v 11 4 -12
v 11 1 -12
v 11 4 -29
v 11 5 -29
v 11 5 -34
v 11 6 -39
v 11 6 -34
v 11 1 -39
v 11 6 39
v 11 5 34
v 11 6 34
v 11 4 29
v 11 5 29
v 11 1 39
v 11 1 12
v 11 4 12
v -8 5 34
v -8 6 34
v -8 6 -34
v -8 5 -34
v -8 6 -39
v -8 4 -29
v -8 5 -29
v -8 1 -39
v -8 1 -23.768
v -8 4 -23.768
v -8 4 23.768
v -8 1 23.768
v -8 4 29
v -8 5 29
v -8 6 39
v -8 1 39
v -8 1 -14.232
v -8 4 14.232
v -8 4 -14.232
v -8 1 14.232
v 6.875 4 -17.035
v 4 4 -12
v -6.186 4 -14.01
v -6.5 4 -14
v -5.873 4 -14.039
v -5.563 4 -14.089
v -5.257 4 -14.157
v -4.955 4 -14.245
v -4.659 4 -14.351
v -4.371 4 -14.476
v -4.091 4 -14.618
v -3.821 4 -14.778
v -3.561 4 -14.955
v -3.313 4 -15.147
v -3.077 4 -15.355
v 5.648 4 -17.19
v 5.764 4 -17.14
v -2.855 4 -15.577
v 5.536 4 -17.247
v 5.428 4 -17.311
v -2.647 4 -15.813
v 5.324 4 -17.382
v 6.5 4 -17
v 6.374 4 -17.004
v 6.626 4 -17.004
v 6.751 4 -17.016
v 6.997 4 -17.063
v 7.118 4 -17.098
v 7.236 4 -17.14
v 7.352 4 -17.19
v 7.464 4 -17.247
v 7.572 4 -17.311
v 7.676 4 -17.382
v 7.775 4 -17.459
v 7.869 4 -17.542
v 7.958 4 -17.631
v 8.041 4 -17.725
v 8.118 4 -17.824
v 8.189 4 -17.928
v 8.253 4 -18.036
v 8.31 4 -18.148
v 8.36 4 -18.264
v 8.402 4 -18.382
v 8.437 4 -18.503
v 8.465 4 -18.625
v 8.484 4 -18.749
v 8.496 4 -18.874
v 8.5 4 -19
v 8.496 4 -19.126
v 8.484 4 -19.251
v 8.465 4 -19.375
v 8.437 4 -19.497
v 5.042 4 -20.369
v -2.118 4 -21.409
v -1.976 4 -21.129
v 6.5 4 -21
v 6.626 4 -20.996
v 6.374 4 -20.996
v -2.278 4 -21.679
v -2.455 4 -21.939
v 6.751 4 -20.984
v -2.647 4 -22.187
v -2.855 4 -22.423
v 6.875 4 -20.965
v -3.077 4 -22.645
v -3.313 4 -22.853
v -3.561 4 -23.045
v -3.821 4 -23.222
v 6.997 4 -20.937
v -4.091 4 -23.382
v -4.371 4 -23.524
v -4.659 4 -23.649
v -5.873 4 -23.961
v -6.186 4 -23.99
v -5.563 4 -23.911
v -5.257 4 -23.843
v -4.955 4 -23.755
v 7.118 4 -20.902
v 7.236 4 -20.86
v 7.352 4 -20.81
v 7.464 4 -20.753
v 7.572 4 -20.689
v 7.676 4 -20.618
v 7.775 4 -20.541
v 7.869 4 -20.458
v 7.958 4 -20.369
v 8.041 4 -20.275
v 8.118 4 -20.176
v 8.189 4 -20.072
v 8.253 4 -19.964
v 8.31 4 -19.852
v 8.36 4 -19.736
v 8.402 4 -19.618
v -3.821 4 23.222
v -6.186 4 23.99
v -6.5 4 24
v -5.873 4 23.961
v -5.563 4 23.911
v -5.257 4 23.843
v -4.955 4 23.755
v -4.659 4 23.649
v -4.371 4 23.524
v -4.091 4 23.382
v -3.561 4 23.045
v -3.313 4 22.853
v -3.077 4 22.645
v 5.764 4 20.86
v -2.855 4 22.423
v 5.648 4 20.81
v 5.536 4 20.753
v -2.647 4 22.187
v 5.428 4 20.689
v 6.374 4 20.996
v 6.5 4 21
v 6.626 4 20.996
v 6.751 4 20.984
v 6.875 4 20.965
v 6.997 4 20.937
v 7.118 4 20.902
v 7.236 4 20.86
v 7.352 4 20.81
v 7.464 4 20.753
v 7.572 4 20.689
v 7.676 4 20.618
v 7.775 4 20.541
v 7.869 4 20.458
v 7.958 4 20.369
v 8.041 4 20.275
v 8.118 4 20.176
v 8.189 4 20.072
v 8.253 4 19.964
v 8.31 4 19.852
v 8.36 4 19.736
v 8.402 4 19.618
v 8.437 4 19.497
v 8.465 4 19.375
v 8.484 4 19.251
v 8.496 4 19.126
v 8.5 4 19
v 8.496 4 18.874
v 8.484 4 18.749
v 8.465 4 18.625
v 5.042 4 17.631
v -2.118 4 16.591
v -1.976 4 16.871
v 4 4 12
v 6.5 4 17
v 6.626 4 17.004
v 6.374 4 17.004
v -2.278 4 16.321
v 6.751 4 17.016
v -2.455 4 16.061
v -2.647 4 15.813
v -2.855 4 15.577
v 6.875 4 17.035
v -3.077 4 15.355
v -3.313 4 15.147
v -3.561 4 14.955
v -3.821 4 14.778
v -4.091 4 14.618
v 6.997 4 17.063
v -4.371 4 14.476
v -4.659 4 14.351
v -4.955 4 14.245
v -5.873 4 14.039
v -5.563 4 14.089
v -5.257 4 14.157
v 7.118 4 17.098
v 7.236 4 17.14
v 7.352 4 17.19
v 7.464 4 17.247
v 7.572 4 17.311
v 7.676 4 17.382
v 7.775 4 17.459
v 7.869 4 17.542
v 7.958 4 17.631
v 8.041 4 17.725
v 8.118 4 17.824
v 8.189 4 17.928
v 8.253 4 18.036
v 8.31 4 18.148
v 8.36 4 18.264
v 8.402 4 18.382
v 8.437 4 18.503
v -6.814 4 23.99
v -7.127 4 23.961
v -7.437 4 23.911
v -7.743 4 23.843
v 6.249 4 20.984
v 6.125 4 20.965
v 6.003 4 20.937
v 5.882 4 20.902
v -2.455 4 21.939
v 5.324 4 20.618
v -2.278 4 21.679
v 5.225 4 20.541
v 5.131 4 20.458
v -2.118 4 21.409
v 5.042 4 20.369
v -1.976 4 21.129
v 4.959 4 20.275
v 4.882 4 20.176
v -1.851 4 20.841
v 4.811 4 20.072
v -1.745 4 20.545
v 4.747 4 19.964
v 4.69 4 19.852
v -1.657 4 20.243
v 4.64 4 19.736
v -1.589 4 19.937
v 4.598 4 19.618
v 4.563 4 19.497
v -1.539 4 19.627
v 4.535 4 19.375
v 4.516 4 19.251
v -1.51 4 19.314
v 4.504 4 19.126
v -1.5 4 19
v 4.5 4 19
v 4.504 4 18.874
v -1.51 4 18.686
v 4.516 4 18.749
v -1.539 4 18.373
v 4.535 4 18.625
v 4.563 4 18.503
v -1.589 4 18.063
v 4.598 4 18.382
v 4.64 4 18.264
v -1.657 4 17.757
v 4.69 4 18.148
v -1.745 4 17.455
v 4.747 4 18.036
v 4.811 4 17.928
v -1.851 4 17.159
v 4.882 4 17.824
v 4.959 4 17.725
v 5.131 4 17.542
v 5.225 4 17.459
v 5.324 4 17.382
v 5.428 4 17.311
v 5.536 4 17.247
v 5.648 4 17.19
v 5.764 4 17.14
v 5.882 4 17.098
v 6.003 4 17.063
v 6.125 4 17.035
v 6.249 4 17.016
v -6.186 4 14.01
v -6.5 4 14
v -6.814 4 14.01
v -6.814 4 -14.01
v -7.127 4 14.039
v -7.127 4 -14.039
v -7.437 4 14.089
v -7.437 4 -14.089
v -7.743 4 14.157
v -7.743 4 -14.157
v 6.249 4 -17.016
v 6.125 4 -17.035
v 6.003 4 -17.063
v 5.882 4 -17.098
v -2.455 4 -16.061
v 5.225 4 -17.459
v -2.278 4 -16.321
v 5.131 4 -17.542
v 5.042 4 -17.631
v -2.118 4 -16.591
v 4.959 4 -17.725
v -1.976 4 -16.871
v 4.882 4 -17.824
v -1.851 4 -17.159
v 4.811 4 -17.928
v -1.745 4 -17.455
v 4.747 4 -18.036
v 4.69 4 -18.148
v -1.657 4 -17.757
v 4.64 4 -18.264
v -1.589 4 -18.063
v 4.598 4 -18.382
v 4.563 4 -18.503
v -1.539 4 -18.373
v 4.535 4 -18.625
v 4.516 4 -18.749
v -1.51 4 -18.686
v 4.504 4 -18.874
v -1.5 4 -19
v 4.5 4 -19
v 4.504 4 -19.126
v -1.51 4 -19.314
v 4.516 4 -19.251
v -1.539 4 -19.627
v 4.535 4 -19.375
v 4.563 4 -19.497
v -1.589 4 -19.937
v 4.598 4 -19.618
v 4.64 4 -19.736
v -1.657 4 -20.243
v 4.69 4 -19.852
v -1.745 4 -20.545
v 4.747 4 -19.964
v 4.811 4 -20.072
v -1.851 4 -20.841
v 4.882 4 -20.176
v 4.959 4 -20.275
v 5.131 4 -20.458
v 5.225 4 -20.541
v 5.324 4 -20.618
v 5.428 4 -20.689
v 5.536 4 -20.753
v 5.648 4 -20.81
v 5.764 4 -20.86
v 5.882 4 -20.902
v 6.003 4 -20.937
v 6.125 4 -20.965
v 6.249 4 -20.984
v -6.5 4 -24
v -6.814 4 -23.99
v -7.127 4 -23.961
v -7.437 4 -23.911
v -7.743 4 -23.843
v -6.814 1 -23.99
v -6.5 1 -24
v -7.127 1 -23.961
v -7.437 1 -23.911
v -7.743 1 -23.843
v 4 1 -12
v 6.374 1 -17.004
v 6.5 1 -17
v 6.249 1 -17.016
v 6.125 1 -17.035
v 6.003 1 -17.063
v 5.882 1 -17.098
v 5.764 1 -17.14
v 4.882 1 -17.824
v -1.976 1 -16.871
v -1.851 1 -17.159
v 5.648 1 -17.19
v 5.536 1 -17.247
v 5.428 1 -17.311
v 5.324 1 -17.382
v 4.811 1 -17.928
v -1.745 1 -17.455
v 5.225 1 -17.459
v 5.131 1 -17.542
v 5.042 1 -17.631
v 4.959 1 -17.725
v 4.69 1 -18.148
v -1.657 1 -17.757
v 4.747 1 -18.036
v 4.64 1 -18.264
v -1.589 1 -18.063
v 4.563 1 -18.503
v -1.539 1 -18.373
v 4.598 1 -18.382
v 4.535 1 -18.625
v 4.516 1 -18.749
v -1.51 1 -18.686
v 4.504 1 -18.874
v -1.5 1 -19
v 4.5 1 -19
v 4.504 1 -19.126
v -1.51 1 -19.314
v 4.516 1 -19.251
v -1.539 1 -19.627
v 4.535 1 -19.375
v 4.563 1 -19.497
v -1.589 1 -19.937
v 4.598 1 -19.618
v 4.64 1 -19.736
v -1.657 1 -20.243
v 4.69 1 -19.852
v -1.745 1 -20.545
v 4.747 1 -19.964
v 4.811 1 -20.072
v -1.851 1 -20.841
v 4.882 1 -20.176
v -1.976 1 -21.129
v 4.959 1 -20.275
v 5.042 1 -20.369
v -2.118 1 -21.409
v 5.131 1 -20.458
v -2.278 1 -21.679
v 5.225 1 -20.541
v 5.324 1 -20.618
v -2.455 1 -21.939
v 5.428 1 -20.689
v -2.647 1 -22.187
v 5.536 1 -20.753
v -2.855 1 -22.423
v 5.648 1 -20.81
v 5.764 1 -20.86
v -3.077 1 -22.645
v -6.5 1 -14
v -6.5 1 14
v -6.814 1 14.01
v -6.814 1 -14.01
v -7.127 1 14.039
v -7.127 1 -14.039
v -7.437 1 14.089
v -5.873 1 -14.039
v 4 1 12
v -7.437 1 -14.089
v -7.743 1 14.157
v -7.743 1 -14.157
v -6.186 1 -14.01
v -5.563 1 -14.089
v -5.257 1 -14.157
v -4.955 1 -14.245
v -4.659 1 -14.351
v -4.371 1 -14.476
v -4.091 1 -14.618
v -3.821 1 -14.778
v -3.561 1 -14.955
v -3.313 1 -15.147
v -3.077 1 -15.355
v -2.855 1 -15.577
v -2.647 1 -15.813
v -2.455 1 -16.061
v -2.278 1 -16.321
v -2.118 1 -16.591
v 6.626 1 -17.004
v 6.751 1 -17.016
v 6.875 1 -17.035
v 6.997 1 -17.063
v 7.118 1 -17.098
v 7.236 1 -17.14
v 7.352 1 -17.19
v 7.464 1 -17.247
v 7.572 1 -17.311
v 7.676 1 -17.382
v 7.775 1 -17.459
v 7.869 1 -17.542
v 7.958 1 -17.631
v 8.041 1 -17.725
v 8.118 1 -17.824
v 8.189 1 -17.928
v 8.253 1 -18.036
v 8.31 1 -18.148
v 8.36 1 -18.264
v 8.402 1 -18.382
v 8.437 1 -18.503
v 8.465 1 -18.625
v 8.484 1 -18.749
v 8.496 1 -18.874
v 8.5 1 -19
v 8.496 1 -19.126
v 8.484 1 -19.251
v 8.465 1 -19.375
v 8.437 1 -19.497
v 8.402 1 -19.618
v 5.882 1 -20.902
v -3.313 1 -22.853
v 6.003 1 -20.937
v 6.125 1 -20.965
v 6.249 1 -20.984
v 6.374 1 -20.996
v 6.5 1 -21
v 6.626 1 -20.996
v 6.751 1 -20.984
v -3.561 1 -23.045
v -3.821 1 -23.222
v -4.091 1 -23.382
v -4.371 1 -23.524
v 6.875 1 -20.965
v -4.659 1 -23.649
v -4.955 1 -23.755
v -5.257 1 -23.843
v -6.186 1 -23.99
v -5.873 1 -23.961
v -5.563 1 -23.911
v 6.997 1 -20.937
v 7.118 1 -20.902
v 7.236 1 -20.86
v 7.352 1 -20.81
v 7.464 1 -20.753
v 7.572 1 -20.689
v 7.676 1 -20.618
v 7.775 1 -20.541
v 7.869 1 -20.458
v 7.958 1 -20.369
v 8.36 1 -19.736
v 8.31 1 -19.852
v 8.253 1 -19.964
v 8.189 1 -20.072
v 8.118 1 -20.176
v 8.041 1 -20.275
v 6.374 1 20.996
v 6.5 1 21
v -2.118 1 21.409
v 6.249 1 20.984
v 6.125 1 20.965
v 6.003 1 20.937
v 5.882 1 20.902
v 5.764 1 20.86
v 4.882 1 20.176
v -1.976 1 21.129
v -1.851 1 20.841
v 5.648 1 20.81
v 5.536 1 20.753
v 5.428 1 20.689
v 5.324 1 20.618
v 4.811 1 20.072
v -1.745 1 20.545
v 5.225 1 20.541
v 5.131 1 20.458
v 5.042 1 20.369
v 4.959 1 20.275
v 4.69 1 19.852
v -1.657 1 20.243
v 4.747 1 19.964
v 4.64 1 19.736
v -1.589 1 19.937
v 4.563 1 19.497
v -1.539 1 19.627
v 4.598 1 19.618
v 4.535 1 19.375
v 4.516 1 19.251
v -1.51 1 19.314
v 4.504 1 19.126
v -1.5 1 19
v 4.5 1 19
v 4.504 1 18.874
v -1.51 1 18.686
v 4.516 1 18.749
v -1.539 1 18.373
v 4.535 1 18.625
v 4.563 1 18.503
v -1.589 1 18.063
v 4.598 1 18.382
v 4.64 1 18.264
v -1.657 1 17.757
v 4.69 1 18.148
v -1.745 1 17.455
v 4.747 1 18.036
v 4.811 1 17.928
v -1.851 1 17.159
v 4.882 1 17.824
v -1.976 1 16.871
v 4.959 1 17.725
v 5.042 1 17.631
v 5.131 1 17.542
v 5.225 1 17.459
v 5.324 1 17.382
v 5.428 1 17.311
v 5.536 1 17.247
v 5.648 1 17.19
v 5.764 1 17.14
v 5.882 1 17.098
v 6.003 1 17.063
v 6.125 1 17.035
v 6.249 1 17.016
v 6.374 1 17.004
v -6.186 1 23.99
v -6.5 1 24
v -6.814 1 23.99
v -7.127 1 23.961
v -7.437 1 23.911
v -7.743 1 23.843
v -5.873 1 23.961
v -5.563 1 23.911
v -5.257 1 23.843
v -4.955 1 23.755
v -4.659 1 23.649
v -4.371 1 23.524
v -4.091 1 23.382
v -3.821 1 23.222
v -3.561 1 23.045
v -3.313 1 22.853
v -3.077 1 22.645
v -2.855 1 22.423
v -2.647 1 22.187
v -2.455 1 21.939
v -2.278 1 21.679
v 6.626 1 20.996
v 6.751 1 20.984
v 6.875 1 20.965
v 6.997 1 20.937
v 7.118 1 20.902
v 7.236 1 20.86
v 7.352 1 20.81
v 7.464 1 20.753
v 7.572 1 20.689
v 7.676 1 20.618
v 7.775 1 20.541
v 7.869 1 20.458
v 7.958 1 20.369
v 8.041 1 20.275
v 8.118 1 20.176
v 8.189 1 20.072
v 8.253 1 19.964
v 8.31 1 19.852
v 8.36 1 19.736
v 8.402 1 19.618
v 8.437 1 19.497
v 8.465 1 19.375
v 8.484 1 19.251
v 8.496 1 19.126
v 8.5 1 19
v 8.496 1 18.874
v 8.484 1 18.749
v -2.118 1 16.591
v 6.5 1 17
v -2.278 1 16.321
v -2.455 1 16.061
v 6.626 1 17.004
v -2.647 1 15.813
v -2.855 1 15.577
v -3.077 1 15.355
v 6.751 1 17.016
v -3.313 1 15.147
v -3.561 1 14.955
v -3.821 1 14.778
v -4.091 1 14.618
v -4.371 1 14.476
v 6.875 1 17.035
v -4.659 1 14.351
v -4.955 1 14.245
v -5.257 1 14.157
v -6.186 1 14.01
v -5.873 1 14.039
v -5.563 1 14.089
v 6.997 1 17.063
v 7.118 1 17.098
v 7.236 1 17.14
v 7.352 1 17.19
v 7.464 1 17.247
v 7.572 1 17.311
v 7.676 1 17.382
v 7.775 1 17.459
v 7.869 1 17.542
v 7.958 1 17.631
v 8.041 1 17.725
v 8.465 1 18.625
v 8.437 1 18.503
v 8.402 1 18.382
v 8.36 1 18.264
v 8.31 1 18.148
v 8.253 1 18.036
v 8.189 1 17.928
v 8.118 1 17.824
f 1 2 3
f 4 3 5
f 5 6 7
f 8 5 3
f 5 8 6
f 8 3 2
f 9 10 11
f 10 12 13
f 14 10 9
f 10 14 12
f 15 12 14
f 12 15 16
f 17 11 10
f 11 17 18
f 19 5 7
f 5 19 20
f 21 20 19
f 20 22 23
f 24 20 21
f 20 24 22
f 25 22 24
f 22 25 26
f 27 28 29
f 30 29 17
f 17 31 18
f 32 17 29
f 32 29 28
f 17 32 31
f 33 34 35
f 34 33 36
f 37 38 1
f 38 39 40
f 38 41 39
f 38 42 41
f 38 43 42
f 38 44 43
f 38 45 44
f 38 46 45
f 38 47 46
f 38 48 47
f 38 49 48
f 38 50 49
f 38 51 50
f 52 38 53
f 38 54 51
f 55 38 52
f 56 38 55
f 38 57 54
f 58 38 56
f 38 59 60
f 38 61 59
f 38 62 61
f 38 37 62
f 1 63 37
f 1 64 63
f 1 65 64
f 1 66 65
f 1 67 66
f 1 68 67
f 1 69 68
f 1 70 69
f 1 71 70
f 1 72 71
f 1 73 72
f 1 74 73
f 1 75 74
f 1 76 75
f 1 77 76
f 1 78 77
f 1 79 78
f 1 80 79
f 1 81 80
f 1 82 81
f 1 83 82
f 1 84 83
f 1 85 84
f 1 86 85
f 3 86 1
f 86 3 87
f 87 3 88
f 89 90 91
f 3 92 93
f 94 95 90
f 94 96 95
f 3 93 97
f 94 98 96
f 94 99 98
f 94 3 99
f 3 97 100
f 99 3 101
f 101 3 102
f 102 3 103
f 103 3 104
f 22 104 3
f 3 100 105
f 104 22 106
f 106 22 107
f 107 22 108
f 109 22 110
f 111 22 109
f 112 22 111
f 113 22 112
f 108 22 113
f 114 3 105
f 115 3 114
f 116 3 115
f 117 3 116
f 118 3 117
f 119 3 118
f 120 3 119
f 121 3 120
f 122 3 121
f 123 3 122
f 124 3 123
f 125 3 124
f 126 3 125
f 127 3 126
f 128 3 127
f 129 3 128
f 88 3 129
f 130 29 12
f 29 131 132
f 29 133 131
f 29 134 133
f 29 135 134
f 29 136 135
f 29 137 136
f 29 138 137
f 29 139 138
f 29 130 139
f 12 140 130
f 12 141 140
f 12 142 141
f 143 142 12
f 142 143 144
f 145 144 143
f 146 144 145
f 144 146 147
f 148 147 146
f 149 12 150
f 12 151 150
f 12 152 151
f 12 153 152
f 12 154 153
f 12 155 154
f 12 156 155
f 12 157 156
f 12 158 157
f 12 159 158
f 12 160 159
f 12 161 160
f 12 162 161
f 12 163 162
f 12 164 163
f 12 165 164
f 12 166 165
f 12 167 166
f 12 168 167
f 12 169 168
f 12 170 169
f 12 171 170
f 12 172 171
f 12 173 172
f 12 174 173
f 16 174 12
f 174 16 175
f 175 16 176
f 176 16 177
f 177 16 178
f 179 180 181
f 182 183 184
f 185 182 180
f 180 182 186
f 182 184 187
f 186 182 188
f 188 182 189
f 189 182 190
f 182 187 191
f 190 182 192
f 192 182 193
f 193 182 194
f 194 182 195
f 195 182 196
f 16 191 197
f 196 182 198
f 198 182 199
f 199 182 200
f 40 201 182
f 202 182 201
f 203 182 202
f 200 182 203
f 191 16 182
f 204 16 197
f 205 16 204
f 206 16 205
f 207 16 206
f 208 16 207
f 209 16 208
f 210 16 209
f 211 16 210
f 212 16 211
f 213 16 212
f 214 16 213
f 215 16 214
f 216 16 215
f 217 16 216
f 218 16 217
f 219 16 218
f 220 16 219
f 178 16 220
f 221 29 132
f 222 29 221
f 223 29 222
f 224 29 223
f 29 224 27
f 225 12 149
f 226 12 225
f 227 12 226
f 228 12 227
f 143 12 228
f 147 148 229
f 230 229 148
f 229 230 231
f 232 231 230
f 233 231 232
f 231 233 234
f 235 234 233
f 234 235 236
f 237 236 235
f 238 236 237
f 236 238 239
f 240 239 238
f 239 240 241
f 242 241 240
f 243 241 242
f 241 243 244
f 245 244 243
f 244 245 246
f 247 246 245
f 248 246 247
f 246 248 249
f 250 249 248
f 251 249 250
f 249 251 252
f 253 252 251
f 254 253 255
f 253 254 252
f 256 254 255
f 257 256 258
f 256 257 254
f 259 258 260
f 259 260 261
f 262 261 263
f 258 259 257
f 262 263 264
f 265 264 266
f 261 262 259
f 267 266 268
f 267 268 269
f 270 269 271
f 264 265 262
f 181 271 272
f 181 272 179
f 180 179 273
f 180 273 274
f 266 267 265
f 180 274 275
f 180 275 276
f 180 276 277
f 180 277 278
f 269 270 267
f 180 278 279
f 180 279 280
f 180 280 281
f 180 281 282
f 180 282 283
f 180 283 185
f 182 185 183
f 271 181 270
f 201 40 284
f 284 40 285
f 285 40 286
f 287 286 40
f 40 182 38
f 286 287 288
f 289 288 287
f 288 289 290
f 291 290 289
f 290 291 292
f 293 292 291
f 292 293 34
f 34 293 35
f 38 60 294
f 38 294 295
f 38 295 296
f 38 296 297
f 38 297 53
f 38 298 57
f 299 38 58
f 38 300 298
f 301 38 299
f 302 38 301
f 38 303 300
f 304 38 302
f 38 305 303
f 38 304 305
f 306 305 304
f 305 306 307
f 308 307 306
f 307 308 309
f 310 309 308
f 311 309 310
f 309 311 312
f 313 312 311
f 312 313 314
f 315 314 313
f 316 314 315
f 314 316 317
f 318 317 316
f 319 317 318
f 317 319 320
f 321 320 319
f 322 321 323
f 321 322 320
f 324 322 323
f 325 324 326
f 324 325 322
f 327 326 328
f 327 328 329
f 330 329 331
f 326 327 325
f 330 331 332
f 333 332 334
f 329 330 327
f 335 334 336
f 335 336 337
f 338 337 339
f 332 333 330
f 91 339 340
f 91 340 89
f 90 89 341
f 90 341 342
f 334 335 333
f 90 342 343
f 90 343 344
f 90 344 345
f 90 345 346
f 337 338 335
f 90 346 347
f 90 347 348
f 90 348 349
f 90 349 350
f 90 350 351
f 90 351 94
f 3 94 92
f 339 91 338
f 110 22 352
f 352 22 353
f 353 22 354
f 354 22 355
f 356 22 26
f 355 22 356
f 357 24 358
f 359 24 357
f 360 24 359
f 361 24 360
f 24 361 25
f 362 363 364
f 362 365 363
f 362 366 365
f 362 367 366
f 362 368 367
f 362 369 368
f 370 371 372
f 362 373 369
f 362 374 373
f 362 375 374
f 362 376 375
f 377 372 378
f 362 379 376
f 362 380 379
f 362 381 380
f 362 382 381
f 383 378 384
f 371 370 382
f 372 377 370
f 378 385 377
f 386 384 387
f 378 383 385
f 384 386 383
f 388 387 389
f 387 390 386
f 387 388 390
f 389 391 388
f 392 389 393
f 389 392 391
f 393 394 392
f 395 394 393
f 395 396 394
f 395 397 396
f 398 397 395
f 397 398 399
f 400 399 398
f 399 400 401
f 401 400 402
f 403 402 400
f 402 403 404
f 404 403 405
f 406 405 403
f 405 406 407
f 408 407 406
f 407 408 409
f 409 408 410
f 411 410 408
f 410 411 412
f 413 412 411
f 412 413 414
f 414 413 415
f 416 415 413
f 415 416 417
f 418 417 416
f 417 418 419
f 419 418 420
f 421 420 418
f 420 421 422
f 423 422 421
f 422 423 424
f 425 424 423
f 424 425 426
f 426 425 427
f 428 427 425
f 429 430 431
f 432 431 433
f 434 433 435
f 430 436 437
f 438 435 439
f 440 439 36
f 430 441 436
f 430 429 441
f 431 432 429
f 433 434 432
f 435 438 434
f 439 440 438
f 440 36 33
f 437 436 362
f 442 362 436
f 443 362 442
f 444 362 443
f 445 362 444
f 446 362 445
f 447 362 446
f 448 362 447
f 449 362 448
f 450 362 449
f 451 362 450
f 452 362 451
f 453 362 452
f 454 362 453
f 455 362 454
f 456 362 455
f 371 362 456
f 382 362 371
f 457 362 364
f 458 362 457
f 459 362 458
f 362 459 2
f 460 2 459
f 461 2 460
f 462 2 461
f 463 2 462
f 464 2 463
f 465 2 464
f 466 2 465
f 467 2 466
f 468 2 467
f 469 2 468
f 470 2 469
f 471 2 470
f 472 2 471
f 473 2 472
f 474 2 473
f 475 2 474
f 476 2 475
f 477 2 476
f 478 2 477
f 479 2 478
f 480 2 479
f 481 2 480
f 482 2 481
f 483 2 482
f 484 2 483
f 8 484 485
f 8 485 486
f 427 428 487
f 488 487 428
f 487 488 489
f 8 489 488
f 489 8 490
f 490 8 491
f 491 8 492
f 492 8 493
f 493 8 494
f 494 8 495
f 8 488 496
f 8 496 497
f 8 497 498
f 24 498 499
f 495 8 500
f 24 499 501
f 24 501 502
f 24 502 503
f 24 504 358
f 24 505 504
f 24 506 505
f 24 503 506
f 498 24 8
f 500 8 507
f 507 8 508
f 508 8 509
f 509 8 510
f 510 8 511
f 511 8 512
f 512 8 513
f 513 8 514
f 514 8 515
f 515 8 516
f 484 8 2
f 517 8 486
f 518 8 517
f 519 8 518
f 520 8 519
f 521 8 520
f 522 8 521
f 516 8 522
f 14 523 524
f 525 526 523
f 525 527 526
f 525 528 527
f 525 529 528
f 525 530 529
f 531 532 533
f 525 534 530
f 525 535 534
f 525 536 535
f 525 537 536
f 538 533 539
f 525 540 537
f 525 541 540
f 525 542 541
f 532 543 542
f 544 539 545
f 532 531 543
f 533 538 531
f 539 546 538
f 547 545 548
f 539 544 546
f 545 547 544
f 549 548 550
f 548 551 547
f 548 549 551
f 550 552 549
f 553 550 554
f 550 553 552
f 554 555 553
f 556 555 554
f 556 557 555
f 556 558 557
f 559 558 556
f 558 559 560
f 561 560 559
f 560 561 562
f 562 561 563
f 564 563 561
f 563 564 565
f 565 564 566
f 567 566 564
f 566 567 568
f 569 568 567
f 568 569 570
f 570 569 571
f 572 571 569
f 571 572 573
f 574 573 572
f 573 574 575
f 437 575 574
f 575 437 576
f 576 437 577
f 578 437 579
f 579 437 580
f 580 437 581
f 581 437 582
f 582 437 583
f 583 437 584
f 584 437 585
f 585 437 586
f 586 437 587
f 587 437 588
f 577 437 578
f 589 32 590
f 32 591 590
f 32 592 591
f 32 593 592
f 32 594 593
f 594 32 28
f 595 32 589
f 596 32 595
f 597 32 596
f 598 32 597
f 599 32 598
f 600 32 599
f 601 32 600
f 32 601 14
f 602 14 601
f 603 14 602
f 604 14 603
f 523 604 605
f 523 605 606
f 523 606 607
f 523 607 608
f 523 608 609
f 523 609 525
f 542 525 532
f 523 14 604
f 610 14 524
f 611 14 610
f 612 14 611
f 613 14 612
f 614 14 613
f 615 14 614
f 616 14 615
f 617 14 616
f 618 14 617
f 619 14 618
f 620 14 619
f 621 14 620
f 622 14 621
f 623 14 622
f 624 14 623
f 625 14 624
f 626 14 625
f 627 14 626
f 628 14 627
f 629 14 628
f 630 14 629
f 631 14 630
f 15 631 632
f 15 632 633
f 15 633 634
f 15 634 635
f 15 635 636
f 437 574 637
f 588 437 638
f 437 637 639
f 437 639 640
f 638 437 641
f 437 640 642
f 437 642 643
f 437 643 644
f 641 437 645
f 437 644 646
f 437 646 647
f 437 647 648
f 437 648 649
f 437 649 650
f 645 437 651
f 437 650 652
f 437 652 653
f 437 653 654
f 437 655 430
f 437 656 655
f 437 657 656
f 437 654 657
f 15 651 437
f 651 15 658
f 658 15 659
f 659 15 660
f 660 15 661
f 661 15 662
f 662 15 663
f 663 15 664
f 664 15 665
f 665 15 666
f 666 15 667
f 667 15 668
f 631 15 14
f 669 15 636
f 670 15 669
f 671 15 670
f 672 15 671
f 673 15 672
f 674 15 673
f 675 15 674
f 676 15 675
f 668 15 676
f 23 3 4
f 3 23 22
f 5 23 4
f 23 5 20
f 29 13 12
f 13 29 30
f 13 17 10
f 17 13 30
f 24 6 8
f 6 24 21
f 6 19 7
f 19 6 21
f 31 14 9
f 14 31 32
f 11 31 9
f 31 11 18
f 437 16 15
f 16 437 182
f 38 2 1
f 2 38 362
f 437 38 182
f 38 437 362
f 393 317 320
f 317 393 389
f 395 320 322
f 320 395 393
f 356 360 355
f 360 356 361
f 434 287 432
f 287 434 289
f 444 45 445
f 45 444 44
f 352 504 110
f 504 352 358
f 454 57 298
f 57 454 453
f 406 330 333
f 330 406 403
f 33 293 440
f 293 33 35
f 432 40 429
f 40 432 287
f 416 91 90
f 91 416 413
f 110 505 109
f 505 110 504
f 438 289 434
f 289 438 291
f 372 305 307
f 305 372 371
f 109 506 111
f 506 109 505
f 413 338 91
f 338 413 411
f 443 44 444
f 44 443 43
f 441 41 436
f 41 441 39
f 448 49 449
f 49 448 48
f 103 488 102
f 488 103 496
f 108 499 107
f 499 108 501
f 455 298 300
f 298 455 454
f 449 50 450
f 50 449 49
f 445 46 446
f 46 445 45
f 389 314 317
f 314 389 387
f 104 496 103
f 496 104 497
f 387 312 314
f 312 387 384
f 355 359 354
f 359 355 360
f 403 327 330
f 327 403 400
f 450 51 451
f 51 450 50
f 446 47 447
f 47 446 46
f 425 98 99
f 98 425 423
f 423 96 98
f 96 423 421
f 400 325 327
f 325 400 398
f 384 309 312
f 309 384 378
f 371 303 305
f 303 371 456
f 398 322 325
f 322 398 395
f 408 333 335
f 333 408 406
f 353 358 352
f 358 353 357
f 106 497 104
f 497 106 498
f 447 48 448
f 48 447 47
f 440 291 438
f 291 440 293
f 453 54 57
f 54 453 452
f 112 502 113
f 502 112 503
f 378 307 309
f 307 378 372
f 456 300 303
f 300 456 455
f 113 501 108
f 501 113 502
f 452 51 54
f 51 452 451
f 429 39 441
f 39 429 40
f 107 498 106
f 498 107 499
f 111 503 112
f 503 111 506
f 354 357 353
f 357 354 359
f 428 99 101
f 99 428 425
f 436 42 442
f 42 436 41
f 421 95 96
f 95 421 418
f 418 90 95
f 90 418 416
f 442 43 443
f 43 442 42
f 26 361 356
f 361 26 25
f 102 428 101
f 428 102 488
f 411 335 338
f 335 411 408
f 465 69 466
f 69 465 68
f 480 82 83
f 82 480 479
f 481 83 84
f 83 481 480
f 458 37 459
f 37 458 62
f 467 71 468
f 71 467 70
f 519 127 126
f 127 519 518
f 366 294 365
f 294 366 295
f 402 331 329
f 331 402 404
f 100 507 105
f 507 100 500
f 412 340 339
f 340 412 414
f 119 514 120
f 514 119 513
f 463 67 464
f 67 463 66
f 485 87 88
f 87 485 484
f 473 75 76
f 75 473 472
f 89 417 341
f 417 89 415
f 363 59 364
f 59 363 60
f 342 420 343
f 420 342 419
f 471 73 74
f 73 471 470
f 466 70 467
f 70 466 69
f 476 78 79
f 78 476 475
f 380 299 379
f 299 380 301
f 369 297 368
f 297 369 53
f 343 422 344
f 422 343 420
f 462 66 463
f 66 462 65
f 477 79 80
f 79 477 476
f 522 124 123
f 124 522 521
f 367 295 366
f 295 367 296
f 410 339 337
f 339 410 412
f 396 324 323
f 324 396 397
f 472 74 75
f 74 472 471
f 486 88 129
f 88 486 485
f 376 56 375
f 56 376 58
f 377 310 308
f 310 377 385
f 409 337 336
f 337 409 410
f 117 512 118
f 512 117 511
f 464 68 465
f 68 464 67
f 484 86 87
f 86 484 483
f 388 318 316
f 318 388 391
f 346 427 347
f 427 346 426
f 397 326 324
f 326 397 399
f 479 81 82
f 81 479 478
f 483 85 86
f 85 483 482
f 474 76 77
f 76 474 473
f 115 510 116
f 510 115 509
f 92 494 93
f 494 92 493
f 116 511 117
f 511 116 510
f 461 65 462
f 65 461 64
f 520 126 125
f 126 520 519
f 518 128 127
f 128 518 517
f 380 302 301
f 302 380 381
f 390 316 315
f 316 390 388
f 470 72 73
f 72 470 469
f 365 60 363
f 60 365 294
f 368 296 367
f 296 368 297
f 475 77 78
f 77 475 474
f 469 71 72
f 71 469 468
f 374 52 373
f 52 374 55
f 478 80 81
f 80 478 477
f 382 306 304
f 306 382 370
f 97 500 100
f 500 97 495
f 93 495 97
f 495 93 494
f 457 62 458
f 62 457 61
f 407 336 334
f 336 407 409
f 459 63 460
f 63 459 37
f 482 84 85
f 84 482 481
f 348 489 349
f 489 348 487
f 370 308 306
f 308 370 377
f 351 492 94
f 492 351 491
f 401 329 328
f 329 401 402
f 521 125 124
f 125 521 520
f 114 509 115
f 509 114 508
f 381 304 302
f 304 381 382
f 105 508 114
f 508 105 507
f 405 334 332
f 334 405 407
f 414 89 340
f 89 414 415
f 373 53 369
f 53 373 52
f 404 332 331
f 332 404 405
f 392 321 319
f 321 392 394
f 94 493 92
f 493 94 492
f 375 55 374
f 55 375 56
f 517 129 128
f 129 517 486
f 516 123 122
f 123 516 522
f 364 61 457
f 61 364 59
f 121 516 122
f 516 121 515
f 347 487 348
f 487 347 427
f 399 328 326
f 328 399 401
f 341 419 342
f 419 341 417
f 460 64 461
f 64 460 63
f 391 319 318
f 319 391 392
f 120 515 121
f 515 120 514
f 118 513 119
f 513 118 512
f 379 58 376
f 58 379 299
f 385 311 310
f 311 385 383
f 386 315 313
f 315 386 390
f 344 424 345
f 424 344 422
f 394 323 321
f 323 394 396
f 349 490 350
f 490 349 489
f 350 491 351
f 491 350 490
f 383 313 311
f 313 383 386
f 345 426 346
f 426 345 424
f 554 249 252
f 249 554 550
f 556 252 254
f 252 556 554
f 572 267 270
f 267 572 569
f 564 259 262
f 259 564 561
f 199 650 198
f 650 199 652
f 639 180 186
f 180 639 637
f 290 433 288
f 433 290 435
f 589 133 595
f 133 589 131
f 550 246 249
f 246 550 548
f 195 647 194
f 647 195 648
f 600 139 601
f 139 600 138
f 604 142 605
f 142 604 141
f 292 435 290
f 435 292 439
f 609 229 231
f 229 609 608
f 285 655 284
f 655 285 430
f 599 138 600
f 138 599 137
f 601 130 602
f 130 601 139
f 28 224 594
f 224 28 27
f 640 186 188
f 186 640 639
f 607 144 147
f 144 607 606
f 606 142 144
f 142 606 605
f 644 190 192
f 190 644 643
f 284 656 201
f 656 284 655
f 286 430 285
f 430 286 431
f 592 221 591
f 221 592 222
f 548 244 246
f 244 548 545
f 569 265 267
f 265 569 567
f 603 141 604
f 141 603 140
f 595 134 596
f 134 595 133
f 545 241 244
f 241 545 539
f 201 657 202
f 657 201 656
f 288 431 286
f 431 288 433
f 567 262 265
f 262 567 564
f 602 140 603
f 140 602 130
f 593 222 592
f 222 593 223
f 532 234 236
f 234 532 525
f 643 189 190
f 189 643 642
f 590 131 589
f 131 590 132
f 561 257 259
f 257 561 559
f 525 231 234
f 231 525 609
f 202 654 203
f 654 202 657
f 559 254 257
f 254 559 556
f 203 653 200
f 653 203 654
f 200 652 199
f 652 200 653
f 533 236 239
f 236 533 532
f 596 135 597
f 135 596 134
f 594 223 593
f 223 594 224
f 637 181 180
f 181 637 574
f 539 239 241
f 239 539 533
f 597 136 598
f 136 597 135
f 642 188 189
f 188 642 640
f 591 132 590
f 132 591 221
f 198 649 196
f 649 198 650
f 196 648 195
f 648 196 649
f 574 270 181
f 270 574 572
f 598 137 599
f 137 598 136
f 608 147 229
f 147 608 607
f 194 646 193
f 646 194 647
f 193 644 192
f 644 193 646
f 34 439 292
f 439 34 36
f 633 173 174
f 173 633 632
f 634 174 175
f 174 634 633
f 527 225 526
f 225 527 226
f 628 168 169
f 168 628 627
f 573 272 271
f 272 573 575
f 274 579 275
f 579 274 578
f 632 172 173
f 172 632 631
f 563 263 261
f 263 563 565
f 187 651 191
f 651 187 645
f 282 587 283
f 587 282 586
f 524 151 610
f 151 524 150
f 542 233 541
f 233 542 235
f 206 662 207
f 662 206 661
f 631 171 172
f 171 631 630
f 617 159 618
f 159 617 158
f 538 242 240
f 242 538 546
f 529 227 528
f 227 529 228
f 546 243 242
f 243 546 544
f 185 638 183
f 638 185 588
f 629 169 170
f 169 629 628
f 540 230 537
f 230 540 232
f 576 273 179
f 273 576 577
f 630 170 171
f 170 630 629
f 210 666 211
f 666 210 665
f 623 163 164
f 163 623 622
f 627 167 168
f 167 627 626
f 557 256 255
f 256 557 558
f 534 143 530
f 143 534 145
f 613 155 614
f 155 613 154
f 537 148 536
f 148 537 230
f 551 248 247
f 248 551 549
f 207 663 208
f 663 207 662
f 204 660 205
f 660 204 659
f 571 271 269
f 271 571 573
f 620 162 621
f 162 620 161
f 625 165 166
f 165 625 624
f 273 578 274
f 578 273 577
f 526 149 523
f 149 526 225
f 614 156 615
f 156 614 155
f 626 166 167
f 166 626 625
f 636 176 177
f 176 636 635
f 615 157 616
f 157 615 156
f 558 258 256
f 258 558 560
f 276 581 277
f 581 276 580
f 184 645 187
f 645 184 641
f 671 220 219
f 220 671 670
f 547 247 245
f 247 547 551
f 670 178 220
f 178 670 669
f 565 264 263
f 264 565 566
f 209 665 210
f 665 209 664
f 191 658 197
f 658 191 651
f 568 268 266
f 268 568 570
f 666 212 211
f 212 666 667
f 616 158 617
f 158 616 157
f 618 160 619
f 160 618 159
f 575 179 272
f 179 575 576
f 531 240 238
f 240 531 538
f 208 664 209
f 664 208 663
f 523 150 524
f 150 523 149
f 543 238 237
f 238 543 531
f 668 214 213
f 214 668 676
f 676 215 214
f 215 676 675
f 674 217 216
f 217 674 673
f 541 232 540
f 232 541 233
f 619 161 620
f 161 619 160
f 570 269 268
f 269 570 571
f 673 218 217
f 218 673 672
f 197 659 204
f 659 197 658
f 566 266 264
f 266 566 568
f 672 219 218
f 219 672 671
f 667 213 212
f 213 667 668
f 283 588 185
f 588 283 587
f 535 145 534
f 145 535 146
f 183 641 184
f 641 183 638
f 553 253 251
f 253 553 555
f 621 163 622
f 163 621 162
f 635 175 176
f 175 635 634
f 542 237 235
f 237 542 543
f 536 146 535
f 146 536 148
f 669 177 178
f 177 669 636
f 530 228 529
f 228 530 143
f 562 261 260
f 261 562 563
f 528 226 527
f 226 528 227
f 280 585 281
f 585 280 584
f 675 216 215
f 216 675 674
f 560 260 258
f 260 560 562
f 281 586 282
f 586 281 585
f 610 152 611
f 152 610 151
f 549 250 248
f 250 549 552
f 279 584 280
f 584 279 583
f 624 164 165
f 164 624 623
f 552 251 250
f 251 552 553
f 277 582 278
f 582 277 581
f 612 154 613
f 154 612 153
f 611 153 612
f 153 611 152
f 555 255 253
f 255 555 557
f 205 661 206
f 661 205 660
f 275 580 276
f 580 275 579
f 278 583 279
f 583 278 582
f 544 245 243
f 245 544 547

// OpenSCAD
difference(){
	union(){
        translate([-8,1,-34]){
            cube([19,3,68], center=false);
        }           

        translate([-8,1,-34]){
            cube([19,4,5], center=false);
        }           
        translate([-8,1,-34+68-5]){
            cube([19,4,5], center=false);
        }           

        translate([-8,1,-34-5]){
            cube([19,5,5], center=false);
        }           
        translate([-8,1,-34+68]){
            cube([19,5,5], center=false);
        }           




	}
	union() {
        translate([4,0,-12]){
            cube([8,20,24], center=false);
        }           
       
        translate([-6.5,8.5,-19]){
            rotate([90,0,0]){
                cylinder(h=125, r=5, $fn=100, center=false);
            }
        }         
        translate([6.5,8.5,-19]){
            rotate([90,0,0]){
                cylinder(h=125, r=2, $fn=100, center=false);
            }
        }         

        translate([-6.5,8.5,19]){
            rotate([90,0,0]){
                cylinder(h=125, r=5, $fn=100, center=false);
            }
        }         
        translate([6.5,8.5,19]){
            rotate([90,0,0]){
                cylinder(h=125, r=2, $fn=100, center=false);
            }
        }              



	}
}
